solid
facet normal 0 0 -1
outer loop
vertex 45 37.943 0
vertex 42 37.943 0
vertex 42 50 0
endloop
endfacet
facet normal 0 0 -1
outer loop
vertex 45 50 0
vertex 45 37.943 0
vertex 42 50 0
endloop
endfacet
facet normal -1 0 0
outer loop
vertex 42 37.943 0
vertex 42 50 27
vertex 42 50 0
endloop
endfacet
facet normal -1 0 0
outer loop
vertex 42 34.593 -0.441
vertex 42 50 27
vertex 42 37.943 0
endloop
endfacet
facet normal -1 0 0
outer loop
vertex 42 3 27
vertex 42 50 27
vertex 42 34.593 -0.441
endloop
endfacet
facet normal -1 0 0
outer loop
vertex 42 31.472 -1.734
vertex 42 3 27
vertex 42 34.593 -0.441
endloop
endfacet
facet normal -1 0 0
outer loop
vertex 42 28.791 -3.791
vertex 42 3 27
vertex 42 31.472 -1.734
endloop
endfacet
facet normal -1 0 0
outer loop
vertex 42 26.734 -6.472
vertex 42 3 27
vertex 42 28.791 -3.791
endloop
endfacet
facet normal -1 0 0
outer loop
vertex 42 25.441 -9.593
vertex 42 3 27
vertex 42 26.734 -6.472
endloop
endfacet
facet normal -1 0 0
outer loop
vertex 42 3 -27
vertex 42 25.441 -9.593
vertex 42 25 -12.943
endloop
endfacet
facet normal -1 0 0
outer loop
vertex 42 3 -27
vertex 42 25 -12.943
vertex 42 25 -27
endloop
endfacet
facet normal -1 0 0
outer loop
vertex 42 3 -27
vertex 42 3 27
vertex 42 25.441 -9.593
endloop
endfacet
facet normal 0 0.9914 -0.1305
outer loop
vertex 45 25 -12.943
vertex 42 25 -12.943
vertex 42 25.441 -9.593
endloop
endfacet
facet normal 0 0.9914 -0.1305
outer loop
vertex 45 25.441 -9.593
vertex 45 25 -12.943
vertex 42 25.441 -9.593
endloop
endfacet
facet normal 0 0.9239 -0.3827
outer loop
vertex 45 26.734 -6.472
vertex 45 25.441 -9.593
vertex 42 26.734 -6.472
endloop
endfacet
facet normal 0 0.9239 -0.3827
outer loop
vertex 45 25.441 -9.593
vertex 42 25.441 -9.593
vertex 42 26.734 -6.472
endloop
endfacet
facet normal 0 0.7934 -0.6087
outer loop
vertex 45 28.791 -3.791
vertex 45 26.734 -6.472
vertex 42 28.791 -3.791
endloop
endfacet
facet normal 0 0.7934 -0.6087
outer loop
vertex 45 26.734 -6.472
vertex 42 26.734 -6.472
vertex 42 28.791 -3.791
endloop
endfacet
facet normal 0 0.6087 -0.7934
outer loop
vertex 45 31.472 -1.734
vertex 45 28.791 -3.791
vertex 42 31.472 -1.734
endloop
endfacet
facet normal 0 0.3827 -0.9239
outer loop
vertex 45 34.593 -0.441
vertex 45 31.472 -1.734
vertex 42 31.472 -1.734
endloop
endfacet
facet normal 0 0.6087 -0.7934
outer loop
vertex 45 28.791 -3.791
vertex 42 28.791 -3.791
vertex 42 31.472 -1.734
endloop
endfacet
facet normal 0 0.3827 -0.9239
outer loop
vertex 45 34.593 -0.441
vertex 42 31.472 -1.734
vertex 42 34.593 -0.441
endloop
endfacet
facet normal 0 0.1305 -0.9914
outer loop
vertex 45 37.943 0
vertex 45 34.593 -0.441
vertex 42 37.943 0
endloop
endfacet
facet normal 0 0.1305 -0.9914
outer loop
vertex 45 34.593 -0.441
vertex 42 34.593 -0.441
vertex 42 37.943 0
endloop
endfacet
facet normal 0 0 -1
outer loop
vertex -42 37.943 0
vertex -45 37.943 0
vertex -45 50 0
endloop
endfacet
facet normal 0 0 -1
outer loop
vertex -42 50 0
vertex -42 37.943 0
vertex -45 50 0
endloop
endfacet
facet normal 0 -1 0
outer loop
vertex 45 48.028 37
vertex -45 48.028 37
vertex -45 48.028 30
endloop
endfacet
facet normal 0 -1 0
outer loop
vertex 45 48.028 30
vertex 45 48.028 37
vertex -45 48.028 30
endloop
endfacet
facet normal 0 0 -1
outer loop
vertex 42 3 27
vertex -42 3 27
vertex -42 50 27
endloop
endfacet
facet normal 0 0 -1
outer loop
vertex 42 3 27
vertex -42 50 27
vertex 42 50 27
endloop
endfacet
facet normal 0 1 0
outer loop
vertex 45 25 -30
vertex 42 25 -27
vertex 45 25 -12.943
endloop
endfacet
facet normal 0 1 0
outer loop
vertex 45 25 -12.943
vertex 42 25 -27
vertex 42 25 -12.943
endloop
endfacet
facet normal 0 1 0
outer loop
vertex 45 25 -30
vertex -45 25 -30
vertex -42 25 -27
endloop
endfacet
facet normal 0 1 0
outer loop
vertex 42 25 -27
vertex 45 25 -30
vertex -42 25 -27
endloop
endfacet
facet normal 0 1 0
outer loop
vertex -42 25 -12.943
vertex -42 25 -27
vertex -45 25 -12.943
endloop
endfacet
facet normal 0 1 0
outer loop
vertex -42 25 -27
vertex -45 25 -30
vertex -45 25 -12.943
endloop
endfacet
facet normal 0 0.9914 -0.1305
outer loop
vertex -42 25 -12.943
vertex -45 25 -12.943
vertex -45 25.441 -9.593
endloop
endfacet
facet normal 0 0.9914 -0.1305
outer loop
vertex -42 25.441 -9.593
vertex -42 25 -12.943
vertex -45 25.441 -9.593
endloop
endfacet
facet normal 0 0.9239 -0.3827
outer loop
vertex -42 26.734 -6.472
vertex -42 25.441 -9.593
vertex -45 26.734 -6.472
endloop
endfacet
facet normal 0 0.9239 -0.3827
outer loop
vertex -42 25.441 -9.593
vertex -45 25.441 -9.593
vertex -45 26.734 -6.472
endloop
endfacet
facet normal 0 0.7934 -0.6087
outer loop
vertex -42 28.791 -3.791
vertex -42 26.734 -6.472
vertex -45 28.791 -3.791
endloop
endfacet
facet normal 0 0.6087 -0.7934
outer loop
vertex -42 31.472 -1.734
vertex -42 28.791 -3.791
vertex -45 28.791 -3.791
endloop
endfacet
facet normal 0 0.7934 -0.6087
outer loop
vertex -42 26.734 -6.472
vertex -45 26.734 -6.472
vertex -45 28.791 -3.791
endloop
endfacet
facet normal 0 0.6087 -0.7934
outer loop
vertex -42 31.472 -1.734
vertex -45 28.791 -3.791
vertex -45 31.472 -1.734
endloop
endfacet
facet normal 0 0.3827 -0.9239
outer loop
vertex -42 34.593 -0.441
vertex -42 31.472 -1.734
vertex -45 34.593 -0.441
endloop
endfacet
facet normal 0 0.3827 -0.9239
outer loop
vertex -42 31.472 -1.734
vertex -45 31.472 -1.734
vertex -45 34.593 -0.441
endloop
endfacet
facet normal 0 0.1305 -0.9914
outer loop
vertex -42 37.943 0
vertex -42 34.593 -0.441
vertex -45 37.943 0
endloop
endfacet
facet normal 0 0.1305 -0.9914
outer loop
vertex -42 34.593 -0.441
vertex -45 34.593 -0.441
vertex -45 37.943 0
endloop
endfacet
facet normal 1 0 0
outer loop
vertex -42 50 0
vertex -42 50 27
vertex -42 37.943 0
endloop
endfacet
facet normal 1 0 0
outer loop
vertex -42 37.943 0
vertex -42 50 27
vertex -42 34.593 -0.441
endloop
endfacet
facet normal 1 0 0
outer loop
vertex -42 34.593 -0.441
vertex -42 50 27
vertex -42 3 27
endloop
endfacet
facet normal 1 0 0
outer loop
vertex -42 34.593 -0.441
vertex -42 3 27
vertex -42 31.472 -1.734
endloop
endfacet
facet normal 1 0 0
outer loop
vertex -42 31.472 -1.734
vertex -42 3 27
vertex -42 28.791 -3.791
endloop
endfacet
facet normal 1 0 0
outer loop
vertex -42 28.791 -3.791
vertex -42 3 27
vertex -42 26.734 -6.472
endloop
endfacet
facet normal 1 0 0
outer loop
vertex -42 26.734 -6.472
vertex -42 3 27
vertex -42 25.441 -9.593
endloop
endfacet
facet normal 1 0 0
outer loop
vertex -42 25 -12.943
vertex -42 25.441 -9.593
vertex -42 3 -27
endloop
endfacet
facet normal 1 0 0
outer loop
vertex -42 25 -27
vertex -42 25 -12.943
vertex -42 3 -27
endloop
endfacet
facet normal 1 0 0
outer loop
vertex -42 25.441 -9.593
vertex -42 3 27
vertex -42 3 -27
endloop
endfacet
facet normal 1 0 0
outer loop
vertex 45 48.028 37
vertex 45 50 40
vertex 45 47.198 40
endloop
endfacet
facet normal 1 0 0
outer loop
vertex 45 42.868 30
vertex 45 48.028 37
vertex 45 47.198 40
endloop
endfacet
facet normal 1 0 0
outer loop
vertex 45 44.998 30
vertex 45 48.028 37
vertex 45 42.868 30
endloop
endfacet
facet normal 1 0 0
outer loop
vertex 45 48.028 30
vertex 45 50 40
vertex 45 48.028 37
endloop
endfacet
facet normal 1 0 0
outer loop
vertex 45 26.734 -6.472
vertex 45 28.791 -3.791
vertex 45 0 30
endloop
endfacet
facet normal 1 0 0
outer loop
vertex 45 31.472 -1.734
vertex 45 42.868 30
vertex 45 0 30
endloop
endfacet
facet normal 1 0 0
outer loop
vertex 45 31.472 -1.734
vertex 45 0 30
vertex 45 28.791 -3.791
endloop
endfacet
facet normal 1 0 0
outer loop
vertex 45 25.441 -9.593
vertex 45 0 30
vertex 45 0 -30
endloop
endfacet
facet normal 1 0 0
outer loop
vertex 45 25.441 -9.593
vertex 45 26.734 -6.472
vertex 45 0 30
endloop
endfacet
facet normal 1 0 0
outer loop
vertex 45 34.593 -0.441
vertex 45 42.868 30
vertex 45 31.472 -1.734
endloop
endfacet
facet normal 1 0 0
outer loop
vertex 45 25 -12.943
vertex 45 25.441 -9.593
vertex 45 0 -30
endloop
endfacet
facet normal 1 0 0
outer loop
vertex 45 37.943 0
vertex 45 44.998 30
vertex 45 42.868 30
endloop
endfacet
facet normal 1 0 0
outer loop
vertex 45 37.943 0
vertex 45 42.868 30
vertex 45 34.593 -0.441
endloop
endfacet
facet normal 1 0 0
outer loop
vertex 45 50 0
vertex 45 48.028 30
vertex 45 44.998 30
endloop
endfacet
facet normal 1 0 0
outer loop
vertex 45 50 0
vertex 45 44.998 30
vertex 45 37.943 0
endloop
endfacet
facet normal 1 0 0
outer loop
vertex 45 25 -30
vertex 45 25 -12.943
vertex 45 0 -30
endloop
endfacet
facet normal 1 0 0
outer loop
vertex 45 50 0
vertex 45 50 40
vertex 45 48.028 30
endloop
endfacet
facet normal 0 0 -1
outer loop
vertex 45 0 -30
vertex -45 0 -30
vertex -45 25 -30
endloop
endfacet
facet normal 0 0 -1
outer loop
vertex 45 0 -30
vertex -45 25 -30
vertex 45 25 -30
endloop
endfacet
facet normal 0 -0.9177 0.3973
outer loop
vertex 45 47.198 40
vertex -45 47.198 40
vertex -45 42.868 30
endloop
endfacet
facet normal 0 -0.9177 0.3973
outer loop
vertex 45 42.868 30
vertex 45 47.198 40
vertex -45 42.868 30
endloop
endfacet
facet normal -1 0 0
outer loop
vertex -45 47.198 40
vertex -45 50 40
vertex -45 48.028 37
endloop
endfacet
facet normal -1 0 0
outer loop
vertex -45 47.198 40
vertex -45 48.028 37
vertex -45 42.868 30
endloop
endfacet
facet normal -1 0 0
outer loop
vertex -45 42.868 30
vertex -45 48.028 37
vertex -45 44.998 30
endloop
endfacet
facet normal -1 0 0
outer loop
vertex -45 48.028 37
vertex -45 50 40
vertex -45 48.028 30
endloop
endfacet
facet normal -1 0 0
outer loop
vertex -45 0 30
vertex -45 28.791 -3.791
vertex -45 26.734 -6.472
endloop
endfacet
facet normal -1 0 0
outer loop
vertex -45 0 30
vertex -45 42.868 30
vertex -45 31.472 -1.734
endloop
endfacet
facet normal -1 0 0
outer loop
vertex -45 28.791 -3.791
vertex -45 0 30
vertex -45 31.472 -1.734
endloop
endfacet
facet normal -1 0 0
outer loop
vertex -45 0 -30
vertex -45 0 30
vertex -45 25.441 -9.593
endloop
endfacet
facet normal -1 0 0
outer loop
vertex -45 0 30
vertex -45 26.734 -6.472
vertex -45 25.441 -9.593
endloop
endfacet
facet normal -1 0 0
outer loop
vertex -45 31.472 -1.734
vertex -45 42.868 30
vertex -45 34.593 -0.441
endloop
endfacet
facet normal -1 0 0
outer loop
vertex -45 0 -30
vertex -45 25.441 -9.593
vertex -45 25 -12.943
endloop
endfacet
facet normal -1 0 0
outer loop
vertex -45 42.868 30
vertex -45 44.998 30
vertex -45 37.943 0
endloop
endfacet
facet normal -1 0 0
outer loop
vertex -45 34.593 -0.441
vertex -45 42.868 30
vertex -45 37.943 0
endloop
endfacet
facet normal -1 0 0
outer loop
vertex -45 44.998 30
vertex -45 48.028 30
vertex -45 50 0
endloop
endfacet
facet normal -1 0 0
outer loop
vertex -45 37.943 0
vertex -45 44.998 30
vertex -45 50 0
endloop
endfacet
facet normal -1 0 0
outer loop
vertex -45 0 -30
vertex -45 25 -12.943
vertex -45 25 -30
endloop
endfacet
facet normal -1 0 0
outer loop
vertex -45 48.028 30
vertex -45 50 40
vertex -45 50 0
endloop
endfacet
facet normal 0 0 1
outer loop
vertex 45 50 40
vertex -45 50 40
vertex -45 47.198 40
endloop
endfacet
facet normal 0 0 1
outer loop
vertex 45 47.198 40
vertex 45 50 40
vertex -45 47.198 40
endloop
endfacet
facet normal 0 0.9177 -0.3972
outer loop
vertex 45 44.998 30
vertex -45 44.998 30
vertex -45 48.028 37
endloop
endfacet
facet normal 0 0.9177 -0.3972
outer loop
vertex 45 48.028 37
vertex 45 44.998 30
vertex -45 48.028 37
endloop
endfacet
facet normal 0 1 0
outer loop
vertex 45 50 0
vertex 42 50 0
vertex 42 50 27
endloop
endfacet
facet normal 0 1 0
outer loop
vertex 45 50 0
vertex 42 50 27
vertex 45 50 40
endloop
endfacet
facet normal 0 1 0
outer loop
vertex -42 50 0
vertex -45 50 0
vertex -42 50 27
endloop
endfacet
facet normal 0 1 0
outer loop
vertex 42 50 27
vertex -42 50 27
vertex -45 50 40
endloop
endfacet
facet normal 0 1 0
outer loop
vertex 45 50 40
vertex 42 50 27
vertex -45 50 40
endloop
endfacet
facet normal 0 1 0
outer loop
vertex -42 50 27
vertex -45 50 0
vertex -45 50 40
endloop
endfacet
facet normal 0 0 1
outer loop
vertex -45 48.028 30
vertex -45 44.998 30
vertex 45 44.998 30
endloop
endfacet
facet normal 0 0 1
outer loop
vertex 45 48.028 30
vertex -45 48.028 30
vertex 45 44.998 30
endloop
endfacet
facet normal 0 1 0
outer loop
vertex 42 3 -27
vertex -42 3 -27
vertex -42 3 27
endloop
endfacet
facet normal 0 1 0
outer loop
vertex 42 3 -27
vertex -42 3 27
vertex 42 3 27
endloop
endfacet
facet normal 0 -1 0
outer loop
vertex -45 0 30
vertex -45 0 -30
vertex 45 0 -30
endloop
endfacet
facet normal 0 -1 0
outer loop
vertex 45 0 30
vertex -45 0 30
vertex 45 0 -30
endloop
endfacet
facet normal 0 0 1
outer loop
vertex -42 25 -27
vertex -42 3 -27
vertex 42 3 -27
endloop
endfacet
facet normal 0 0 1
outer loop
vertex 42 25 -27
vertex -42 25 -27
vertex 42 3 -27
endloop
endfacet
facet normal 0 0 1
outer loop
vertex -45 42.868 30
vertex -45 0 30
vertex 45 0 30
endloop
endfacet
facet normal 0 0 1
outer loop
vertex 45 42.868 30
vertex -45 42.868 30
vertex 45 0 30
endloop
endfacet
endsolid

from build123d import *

# Parameters (mm, degrees)
SKETCH1_W           = 90
SKETCH1_H           = 60
BOSS_EXTRUDE1_DEPTH = 50
SHELL1_T            = -3
CUT_EXTRUDE1_DEPTH  = 90
BOSS_EXTRUDE2_DEPTH = 90


with BuildPart() as part:
    # Sketch1 → Boss-Extrude1 (new body)
    with BuildSketch(Plane(origin=(0, 0, 0), x_dir=(1, 0, 0), z_dir=(0, 1, 0))):
        Rectangle(SKETCH1_W, SKETCH1_H)
    extrude(amount=BOSS_EXTRUDE1_DEPTH)

    # Shell1
    shell1_openings = [part.faces().sort_by_distance(p)[0] for p in [
        (0, 50, 0),
    ]]
    offset(amount=SHELL1_T, openings=shell1_openings, kind=Kind.INTERSECTION)

    # Sketch2 → Cut-Extrude1 (cut)
    with BuildSketch(Plane.ZY.offset(45)):
        with BuildLine():
            Line((-30, 25), (-12.94347358, 25))
            ThreePointArc((-12.94347358, 25), (-3.791055639, 28.791055639), (0, 37.94347358))
            Line((0, 37.94347358), (0, 50))
            Line((0, 50), (-30, 50))
            Line((-30, 50), (-30, 25))
        make_face()
    extrude(amount=-CUT_EXTRUDE1_DEPTH, mode=Mode.SUBTRACT)

    # Sketch3 → Boss-Extrude2 (add)
    with BuildSketch(Plane.ZY.offset(45)):
        Polygon((30, 50), (40, 50), (40, 47.197660371), (30, 42.867982808), (30, 44.997500312), (37, 48.028274606), (30, 48.028274606), align=None)
    extrude(amount=-BOSS_EXTRUDE2_DEPTH)


solid = part.part
